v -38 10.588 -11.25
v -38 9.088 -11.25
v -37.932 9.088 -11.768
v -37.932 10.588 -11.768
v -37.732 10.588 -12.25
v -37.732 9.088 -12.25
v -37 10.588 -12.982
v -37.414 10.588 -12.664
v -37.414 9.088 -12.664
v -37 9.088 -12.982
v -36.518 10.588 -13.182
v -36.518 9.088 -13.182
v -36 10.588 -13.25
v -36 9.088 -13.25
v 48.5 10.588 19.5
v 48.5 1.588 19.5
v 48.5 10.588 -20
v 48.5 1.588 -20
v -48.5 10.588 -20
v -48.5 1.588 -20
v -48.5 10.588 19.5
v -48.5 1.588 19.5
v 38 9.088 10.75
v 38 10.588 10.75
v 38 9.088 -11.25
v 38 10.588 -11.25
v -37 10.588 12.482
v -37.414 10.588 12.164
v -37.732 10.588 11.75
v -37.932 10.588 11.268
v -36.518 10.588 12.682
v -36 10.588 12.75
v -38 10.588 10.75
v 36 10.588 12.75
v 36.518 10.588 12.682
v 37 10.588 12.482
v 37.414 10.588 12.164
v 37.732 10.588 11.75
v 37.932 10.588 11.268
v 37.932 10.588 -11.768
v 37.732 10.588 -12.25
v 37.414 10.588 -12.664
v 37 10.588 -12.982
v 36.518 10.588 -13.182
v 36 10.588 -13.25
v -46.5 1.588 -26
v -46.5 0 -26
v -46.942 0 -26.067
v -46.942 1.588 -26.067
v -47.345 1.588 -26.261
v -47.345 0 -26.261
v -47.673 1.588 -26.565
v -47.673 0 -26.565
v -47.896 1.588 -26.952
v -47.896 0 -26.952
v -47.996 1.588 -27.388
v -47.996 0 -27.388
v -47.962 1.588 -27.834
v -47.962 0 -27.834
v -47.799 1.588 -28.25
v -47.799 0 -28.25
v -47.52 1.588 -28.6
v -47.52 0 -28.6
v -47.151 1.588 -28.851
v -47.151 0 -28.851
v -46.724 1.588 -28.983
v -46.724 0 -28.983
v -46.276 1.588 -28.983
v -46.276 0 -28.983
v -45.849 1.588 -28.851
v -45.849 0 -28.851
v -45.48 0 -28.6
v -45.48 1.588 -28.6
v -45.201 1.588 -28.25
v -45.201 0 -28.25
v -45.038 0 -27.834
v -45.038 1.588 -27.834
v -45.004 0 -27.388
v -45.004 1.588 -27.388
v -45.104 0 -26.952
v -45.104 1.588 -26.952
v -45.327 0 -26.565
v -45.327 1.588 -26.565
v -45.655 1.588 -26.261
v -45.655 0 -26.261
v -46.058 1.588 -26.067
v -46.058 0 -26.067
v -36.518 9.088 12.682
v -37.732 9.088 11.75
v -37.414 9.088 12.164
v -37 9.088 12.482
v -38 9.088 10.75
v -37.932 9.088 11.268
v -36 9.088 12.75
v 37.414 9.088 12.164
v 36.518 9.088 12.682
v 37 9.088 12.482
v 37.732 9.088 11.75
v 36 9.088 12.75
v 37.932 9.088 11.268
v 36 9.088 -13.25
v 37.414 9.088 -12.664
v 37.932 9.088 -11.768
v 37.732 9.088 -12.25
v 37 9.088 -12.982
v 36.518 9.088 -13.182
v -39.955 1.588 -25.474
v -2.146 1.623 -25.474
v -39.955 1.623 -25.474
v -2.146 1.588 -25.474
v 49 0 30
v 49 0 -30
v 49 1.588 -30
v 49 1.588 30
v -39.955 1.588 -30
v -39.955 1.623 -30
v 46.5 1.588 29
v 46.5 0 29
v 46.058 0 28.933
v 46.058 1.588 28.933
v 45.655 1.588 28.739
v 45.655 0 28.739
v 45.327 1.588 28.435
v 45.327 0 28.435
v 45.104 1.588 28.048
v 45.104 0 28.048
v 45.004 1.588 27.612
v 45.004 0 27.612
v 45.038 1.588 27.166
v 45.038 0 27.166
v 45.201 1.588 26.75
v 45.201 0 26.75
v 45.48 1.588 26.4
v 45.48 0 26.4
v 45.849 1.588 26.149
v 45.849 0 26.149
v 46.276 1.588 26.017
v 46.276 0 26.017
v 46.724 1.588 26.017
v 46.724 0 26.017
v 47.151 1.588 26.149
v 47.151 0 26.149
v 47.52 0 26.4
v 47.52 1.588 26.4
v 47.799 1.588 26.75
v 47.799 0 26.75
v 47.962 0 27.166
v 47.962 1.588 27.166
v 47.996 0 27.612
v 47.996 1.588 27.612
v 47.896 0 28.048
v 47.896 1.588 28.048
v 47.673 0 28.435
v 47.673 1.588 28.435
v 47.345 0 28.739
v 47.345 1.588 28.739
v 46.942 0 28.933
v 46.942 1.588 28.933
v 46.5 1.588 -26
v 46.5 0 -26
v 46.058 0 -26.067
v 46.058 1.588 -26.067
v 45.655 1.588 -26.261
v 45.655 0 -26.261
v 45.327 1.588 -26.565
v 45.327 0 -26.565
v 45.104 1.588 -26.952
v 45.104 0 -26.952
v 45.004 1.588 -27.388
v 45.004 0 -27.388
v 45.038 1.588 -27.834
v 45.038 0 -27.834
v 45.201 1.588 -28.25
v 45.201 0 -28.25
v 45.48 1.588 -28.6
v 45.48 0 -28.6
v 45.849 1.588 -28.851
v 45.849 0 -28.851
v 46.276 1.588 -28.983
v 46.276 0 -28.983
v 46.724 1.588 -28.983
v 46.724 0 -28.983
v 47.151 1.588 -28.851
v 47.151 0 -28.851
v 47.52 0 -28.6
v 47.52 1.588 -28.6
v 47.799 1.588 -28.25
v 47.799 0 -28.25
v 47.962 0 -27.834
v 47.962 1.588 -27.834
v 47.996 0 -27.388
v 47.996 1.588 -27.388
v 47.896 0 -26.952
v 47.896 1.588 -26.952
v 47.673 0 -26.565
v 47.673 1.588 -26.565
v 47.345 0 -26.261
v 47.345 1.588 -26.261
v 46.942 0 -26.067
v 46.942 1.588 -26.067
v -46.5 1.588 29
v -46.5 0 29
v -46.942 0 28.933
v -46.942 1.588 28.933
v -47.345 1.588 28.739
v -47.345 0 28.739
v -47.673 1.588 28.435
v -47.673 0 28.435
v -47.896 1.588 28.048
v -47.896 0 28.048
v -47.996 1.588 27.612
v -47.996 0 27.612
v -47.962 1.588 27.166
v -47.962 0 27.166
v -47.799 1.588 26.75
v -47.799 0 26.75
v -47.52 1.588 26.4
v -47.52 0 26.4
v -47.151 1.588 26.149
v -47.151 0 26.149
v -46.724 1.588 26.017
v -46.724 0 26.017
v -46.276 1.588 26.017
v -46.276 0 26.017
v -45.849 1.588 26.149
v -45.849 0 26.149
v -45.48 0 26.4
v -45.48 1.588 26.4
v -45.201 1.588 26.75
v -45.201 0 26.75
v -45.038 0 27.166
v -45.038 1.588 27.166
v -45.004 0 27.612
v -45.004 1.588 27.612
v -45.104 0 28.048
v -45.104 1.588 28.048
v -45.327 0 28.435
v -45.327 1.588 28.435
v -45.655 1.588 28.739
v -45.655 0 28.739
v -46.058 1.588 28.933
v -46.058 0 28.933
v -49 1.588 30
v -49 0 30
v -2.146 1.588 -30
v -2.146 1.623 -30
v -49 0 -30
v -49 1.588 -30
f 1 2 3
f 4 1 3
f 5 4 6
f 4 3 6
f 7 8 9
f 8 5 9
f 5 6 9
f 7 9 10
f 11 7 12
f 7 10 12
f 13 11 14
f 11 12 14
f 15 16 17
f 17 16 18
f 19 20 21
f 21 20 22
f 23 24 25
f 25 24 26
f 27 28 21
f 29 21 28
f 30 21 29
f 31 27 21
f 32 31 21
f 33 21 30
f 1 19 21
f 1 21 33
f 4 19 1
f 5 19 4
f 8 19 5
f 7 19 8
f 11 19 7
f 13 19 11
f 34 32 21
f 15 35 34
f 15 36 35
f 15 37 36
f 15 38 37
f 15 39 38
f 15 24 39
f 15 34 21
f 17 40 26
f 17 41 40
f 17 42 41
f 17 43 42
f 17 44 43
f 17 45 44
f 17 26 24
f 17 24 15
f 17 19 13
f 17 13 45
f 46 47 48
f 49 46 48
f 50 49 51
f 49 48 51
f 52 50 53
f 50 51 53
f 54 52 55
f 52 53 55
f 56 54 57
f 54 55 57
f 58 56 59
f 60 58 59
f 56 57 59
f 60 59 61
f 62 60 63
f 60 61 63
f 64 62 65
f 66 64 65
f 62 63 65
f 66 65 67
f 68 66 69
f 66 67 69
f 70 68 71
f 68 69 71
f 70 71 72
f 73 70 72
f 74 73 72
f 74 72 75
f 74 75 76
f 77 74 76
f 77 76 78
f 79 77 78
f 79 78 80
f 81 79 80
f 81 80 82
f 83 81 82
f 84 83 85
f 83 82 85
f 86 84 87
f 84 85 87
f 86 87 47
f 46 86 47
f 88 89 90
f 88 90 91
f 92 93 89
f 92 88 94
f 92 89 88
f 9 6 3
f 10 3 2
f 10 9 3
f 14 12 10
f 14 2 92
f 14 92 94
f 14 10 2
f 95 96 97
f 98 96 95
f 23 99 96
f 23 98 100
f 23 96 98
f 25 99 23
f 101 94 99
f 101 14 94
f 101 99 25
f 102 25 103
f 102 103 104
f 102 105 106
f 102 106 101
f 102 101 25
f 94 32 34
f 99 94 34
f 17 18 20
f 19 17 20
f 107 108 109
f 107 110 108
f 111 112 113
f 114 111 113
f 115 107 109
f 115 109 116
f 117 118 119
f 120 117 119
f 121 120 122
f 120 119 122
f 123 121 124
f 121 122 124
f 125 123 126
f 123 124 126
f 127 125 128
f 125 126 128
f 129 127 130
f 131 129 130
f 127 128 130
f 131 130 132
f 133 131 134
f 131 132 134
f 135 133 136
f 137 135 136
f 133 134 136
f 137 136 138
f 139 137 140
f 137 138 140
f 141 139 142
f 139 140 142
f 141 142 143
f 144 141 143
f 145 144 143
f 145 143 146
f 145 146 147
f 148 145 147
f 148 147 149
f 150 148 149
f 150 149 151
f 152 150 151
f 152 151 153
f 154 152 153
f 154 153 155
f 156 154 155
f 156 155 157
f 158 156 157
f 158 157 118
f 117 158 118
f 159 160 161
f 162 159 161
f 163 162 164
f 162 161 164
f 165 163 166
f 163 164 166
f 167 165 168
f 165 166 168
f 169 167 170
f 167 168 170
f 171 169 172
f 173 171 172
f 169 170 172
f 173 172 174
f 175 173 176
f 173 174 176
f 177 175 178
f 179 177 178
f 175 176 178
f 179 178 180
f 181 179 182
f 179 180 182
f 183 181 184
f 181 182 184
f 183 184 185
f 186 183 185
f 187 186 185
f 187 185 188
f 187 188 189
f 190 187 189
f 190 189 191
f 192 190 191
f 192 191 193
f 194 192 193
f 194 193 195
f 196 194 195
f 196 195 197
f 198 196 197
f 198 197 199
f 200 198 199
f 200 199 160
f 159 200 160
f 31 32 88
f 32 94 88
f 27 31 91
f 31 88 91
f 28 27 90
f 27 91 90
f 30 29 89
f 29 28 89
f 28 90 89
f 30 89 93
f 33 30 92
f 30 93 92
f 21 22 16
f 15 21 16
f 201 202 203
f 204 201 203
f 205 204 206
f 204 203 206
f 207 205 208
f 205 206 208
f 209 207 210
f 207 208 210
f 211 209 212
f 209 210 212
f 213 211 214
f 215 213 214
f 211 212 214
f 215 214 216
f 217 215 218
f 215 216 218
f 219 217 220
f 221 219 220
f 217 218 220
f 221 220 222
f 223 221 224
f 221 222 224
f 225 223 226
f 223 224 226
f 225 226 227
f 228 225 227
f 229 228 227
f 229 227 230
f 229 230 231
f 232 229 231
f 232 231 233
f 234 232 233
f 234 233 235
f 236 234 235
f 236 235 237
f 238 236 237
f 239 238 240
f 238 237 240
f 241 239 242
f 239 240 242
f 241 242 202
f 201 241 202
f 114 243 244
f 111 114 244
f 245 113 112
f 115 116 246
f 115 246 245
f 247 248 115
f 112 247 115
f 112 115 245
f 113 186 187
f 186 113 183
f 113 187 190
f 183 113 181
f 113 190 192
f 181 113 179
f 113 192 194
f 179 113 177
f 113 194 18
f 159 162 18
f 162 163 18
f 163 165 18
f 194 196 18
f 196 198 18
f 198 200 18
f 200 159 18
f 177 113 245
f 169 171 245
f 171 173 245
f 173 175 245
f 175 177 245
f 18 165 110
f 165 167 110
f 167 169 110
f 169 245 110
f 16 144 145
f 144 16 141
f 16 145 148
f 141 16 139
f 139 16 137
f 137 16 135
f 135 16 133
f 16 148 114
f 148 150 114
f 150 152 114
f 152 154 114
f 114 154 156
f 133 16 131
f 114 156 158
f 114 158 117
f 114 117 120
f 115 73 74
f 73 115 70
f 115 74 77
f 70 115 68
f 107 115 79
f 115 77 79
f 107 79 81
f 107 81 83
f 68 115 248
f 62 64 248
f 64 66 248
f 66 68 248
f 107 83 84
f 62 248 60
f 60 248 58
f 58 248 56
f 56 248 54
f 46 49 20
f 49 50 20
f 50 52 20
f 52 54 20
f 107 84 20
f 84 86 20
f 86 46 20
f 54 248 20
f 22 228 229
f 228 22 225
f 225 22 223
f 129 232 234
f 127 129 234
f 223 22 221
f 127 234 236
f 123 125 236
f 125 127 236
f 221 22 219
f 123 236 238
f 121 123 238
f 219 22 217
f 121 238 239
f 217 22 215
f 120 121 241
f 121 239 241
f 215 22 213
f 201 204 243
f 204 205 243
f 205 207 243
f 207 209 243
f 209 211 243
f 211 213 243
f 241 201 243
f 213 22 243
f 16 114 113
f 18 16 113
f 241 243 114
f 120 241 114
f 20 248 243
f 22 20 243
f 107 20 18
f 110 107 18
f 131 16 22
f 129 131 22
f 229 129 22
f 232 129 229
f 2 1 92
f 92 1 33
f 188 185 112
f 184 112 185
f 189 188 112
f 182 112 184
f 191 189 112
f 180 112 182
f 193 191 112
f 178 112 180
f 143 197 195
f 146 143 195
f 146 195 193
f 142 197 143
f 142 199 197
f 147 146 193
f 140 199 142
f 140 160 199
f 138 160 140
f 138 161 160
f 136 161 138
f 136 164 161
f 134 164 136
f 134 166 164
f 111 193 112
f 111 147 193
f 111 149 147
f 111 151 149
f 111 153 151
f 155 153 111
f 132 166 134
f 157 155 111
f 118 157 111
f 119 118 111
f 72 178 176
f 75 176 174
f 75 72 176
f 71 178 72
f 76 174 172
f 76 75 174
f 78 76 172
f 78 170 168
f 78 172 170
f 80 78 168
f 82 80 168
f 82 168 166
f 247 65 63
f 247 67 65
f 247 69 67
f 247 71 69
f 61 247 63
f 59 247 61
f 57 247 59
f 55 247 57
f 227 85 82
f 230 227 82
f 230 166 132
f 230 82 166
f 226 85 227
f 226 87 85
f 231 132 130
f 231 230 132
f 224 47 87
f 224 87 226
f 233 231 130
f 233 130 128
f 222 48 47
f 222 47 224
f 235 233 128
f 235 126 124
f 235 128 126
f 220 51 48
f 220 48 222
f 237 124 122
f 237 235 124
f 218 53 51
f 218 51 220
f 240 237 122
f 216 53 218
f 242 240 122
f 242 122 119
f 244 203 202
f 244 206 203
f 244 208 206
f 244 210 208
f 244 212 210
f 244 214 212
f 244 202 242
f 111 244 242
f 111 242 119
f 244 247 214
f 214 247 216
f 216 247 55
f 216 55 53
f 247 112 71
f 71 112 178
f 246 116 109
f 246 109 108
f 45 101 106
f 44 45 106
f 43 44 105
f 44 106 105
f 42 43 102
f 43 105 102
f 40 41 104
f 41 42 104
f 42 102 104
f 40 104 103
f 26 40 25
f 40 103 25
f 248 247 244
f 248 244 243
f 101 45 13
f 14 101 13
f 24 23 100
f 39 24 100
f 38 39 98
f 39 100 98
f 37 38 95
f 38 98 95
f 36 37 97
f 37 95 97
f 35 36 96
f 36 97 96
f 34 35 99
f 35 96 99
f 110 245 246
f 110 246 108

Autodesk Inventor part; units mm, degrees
ref_plane "XZ Plane" through (0, 0, 0) normal (0, 1, 0) x (-1, 0, 0)
ref_plane "XY Plane" through (0, 0, 0) normal (0, 0, 1) x (1, 0, 0)
ref_plane "Work Plane1" through (-49, 0, 0) normal (1, 0, 0) x (0, 1, 0)
sketch "Sketch1" plane through (-49, 0, 0) normal (1, 0, 0) x (0, 1, 0)
  line L0 (1.5875, -30) -> (1.5875, 30)
  line L1 (1.5875, 30) -> (0, 30)
  line L2 (0, -30) -> (0, 30)
  line L3 (1.5875, -30) -> (0, -30)
  dimension "d44" = 1.5875
  dimension "d45" = 60
extrude "Extrusion3" add sketch "Sketch1" along normal blind 98 draft 0
sketch "Sketch3" plane through (-49, 1.5875, 30) normal (0, 1, 0) x (1, 0, 0)
  line L0 (97.5, 50) -> (0.5, 50)
  line L1 (0.5, 50) -> (0.5, 10.5)
  line L2 (97.5, 10.5) -> (97.5, 50)
  line L3 (0.5, 10.5) -> (97.5, 10.5)
extrude "Extrusion2" add sketch "Sketch3" along normal blind 9
sketch "Sketch4" plane through (-49, 10.5875, 30) normal (0, 1, 0) x (1, 0, 0)
  line L0 (87, 17.25) -> (87, 43.25)
  line L1 (11, 17.25) -> (87, 17.25)
  line L2 (11, 43.25) -> (11, 17.25)
  line L3 (87, 43.25) -> (11, 43.25)
extrude "Extrusion1" cut sketch "Sketch4" against normal blind 1.5
hole "Hole4" at (-46.5, 1.5875, 27.5) direction (0, -1, 0) diameter 3 depth 1.5875
hole "Hole3" at (46.5, 1.5875, 27.5) direction (0, -1, 0) diameter 3 depth 1.5875
sketch "Sketch6" plane through (-49, 1.5875, 30) normal (0, 1, 0) x (1, 0, 0)
  point P0 (95.5, 2.5)
hole "Hole2" at (46.5, 1.5875, -27.5) direction (0, -1, 0) diameter 3 depth 1.5875
sketch "Sketch5" plane through (-49, 1.5875, 30) normal (0, 1, 0) x (1, 0, 0)
  point P0 (2.5, 2.5)
hole "Hole1" at (-46.5, 1.5875, -27.5) direction (0, -1, 0) diameter 3 depth 1.5875
fillet "Fillet4" radius 2 1 edges at (-38, 9.8375, -13.25)
fillet "Fillet3" radius 2 1 edges at (-38, 9.8375, 12.75)
fillet "Fillet2" radius 2 1 edges at (38, 9.8375, 12.75)
fillet "Fillet1" radius 2 1 edges at (38, 9.8375, -13.25)
sketch "Sketch9" plane through (-49, 1.5875, 30) normal (0, 1, 0) x (1, 0, 0)
  line L0 (0, 60) -> (98, 60) projected
  line L1 (9.045, 60) -> (46.854, 60)
  line L2 (46.854, 60) -> (46.854, 55.474)
  line L3 (46.854, 55.474) -> (9.045, 55.474)
  line L4 (9.045, 55.474) -> (9.045, 60)
  line L5 (0, 60) -> (0, 0) projected
  point P0 (49, 30)
  dimension "d41" = 37.809
  dimension "d42" = 4.526
  dimension "d43" = 9.045
extrude "Extrusion4" add sketch "Sketch9" along normal blind 0.0356
sketch "Sketch7" plane through (-49, 1.5875, 30) normal (0, 1, 0) x (1, 0, 0)
  point P0 (95.5, 57.5)
sketch "Sketch8" plane through (-49, 1.5875, 30) normal (0, 1, 0) x (1, 0, 0)
  point P0 (2.5, 57.5)
properties part number "4x20 LCD"
